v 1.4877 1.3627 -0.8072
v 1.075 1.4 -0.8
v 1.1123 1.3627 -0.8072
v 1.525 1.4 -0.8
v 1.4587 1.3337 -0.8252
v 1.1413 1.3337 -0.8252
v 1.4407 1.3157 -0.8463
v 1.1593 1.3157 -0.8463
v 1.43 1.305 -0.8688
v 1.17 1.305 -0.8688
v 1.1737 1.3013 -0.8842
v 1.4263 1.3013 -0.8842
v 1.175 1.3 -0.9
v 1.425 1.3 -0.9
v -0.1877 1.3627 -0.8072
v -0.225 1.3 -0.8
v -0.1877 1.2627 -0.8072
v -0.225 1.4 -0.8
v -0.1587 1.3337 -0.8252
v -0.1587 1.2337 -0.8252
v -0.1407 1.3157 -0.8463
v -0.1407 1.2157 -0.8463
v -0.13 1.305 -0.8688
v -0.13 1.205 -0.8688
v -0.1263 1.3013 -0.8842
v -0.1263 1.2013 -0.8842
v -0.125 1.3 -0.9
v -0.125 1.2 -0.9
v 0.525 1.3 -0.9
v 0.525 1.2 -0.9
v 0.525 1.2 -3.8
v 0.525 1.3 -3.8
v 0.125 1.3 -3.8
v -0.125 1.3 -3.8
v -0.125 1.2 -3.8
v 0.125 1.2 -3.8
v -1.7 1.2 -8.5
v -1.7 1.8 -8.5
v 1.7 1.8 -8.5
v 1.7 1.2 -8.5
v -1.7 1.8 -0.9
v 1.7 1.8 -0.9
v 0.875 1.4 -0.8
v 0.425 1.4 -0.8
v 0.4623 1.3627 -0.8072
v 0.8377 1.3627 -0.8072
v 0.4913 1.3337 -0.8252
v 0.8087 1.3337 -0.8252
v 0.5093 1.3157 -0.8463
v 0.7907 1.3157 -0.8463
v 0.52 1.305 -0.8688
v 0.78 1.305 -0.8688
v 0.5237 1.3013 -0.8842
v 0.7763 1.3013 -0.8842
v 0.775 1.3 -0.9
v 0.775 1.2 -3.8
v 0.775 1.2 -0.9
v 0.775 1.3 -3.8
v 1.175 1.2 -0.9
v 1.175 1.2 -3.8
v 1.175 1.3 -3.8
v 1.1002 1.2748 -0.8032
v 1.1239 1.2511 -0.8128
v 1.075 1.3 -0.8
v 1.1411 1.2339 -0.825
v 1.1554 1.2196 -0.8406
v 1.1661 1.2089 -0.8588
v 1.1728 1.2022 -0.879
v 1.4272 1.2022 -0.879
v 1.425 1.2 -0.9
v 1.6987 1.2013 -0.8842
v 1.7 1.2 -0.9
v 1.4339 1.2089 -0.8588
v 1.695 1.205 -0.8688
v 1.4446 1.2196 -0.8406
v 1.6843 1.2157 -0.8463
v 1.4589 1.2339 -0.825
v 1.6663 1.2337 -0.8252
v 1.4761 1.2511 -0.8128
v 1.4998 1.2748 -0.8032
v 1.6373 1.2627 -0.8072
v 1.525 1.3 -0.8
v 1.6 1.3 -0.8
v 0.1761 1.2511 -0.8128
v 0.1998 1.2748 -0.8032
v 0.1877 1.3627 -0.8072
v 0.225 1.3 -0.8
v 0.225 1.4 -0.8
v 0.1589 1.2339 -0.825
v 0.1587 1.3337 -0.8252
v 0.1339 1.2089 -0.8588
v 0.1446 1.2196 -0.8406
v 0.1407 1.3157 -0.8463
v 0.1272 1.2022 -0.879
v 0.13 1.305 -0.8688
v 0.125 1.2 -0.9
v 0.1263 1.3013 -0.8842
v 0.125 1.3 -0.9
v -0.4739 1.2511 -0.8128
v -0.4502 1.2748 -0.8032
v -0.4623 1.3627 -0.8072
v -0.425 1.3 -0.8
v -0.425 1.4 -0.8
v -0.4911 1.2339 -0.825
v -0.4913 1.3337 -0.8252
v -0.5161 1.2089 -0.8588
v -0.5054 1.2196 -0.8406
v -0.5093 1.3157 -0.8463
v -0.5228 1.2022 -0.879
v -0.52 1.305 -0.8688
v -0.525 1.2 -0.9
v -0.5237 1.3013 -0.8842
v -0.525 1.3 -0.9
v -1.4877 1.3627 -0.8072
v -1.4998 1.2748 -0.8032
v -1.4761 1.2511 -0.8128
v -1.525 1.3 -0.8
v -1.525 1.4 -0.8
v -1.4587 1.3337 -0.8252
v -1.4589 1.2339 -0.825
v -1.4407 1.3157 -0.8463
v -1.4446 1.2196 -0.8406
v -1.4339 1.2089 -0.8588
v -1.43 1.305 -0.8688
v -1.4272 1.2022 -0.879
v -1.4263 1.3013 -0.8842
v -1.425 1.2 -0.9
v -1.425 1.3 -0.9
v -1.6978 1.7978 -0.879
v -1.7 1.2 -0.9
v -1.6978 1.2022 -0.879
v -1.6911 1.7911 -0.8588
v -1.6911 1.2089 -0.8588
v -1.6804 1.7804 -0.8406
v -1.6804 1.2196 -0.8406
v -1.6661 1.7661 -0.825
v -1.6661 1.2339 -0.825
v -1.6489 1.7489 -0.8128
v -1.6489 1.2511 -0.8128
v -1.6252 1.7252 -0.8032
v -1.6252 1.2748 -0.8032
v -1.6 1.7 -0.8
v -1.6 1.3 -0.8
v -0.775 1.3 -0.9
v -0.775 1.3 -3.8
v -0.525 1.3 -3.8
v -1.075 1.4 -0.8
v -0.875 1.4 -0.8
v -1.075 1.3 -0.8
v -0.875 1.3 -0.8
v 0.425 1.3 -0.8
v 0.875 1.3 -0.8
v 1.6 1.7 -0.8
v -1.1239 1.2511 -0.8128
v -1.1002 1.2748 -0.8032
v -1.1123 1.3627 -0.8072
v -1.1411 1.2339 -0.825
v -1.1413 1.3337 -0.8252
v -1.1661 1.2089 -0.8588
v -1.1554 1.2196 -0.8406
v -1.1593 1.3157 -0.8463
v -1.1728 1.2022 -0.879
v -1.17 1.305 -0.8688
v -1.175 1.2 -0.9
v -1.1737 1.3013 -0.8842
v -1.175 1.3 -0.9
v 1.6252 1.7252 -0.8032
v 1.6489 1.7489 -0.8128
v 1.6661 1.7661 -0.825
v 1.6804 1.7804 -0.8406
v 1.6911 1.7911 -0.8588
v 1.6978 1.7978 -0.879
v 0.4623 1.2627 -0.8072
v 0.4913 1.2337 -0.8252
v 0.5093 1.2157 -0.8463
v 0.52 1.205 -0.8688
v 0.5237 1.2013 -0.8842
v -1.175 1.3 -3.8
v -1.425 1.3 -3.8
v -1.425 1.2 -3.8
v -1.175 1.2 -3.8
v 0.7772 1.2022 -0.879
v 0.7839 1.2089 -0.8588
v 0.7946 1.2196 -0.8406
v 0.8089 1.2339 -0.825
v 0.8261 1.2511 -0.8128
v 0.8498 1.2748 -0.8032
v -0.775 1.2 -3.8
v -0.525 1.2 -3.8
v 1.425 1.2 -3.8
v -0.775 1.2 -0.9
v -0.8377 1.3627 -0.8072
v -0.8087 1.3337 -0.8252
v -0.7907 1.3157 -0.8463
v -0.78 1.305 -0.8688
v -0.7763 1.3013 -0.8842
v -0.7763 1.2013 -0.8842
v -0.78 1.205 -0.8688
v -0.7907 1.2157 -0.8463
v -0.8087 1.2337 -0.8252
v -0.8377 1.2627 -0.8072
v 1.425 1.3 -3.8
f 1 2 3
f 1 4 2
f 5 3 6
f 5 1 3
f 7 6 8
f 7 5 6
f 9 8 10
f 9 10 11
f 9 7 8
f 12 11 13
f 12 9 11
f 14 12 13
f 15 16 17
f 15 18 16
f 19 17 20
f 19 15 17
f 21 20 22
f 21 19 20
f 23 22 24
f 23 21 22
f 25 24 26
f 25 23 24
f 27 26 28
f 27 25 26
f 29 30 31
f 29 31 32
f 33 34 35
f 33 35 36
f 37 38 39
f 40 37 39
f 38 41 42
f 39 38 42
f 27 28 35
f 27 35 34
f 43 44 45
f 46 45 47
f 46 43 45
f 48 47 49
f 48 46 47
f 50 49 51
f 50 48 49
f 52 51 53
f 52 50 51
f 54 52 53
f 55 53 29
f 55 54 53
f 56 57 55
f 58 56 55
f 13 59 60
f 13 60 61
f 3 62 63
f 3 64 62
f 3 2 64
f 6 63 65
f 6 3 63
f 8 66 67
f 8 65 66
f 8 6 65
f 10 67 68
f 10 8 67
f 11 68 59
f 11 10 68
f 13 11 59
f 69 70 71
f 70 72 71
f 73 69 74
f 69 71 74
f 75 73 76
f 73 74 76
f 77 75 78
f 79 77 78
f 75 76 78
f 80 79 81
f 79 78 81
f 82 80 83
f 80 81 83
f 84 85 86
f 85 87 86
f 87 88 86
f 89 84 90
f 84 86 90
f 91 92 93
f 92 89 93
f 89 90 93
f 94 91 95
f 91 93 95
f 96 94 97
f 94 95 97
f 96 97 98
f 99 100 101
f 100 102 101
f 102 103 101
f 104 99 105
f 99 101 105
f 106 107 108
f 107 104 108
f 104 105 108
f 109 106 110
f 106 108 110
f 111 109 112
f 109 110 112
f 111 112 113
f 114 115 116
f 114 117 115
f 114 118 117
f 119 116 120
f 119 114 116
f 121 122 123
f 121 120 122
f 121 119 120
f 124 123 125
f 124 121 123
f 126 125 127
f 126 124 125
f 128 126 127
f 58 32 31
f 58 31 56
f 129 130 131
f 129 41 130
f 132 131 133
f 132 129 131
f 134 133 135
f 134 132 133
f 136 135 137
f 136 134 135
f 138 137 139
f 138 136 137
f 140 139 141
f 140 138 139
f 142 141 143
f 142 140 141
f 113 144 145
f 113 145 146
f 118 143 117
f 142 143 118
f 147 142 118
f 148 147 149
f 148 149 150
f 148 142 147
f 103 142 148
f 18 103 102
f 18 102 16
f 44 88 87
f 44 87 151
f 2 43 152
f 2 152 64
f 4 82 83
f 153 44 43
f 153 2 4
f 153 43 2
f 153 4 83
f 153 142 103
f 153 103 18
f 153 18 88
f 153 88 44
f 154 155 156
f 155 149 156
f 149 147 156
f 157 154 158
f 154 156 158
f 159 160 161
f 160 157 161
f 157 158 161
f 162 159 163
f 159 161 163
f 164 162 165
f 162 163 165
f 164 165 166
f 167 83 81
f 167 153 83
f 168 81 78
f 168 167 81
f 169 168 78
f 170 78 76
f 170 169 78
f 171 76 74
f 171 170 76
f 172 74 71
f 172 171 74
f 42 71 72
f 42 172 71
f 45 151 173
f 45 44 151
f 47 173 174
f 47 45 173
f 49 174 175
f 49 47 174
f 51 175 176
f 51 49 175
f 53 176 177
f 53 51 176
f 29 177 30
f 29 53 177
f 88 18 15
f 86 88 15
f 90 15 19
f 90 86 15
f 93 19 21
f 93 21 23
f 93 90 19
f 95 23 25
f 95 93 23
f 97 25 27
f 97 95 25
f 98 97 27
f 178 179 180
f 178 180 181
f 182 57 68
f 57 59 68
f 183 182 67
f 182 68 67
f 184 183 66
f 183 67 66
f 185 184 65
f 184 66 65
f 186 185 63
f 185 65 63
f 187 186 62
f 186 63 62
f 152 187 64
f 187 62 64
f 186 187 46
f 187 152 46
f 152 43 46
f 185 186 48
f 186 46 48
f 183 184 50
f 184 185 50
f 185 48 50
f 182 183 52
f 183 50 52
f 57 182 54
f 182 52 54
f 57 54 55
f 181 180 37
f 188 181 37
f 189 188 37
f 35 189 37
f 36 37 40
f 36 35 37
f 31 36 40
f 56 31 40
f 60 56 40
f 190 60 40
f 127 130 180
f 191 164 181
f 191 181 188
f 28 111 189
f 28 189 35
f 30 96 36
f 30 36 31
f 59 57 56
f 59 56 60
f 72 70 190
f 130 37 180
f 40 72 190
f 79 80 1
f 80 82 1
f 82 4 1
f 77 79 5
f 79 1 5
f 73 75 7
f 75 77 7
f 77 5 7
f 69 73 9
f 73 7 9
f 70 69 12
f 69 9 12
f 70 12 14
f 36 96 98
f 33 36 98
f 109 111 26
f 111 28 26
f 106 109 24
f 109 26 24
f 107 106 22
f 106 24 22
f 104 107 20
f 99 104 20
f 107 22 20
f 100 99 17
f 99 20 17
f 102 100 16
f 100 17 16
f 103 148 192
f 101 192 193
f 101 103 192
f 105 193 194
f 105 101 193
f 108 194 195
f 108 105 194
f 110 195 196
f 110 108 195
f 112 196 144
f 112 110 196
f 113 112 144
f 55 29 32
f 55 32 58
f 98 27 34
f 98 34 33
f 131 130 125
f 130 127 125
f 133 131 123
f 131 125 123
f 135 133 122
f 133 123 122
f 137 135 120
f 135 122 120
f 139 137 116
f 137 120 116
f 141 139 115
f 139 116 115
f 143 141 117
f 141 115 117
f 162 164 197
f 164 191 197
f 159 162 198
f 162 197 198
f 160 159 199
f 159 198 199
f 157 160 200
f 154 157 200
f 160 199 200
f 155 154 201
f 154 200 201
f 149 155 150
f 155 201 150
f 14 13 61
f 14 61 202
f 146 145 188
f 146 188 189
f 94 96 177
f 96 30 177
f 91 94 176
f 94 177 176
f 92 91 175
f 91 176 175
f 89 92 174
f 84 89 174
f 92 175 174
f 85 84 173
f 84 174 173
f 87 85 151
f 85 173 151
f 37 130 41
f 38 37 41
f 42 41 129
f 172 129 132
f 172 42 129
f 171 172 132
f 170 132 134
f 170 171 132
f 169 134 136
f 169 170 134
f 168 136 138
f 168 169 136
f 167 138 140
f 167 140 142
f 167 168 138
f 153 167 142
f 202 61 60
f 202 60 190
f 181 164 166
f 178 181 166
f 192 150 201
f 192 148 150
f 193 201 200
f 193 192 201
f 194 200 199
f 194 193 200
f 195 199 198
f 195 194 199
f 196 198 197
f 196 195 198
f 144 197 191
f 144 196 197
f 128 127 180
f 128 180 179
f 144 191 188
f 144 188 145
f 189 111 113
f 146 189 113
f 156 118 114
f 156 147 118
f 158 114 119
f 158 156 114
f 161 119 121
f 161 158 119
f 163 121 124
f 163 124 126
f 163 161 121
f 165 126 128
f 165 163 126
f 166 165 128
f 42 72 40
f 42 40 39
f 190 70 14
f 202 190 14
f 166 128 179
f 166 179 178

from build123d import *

# Parameters (mm, degrees)
SKETCH2_W                = 3.4
SKETCH2_H                = 0.6
BOSS_EXTRUDE2_DEPTH      = 2.7
BOSS_EXTRUDE2_DEPTH_BACK = 5
SKETCH3_W                = 0.25
SKETCH3_H                = 0.1
CUT_EXTRUDE1_DEPTH       = 3
FILLET1_R                = 0.1


with BuildPart() as part:
    # Sketch2 → Boss-Extrude2 (new body, two sides)
    with BuildSketch(Plane.XY.offset(-3.5)) as boss_extrude2_sk:
        with Locations((0, 1.5)):
            Rectangle(SKETCH2_W, SKETCH2_H)
    extrude(amount=BOSS_EXTRUDE2_DEPTH)
    extrude(boss_extrude2_sk.sketch, amount=-BOSS_EXTRUDE2_DEPTH_BACK)

    # Sketch3 → Cut-Extrude1 (cut)
    with BuildSketch(Plane.XY.offset(-0.8)):
        with Locations((-1.3, 1.25)):
            Rectangle(SKETCH3_W, SKETCH3_H)
        with Locations((-0.65, 1.25)):
            Rectangle(SKETCH3_W, SKETCH3_H)
        with Locations((0, 1.25)):
            Rectangle(SKETCH3_W, SKETCH3_H)
        with Locations((0.65, 1.25)):
            Rectangle(SKETCH3_W, SKETCH3_H)
        with Locations((1.3, 1.25)):
            Rectangle(SKETCH3_W, SKETCH3_H)
    extrude(amount=-CUT_EXTRUDE1_DEPTH, mode=Mode.SUBTRACT)

    # Fillet1
    fillet1_edges = [part.edges().sort_by_distance(p)[0] for p in [
        (0, 1.8, -0.8),
        (1.7, 1.5, -0.8),
        (1.5625, 1.2, -0.8),
        (-1.5625, 1.2, -0.8),
        (-1.7, 1.5, -0.8),
        (0.975, 1.2, -0.8),
        (0.775, 1.25, -0.8),
        (0.65, 1.3, -0.8),
        (0.525, 1.25, -0.8),
        (0.325, 1.2, -0.8),
        (0.125, 1.25, -0.8),
        (0, 1.3, -0.8),
        (-0.125, 1.25, -0.8),
        (-0.325, 1.2, -0.8),
        (-0.525, 1.25, -0.8),
        (-0.65, 1.3, -0.8),
        (-0.775, 1.25, -0.8),
        (-0.975, 1.2, -0.8),
        (-1.175, 1.25, -0.8),
        (-1.3, 1.3, -0.8),
        (-1.425, 1.25, -0.8),
        (1.425, 1.25, -0.8),
        (1.3, 1.3, -0.8),
        (1.175, 1.25, -0.8),
    ]]
    fillet(fillet1_edges, radius=FILLET1_R)


solid = part.part
